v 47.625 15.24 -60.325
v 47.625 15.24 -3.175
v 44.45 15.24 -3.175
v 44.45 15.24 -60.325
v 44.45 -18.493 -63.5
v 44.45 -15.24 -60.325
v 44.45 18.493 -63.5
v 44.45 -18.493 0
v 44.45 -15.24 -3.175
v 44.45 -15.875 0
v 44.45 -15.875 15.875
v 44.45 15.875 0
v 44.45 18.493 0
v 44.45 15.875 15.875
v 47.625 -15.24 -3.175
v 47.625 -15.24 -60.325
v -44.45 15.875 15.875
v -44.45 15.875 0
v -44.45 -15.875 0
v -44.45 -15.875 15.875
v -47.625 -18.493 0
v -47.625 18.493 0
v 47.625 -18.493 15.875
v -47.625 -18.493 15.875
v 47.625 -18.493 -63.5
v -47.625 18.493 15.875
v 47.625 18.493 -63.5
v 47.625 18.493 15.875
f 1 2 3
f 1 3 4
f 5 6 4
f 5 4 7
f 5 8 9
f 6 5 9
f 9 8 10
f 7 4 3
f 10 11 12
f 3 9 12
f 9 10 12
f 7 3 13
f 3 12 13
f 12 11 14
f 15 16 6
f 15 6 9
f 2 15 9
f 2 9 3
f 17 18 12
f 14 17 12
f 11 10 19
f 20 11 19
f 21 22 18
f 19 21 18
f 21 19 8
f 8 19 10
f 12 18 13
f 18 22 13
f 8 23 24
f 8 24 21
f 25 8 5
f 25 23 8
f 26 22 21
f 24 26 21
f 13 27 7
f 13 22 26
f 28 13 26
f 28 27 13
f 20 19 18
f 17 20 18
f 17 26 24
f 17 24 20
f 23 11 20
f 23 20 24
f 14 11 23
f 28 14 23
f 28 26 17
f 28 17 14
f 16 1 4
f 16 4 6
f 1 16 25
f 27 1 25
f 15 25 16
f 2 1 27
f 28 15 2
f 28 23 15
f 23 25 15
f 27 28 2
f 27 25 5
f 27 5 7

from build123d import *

# Parameters (mm, degrees)
F1_DEPTH = 15.875
F3_DEPTH = 3.175


with BuildPart() as f1:
    # F0 (on Top) → F1 (new body)
    with BuildSketch(Plane.XY):
        Polygon((-47.625, 18.49301), (-44.45, 15.875), (0, 15.875), (44.45, 15.875), (47.625, 18.49301), align=None)
        Polygon((-44.45, 0), (-44.45, 15.875), (-47.625, 18.49301), (-47.625, -18.49301), (-44.45, -15.875), align=None)
        Polygon((47.625, 18.49301), (44.45, 15.875), (44.45, 0), (44.45, -15.875), (47.625, -18.49301), align=None)
        Polygon((0, -15.875), (-44.45, -15.875), (-47.625, -18.49301), (47.625, -18.49301), (44.45, -15.875), align=None)
    extrude(amount=F1_DEPTH)

    # F2 (on face) → F3 (join)
    with BuildSketch(Plane.YZ.offset(47.625)):
        Polygon((18.49301, 0), (-18.49301, 0), (-15.24, -3.175), (15.24, -3.175), (15.24, -60.325), (18.49301, -63.5), align=None)
        Polygon((-15.24, -3.175), (-18.49301, 0), (-18.49301, -63.5), (-15.24, -60.325), align=None)
        Polygon((-15.24, -60.325), (-18.49301, -63.5), (18.49301, -63.5), (15.24, -60.325), align=None)
    extrude(amount=-F3_DEPTH)


solid = f1.part
